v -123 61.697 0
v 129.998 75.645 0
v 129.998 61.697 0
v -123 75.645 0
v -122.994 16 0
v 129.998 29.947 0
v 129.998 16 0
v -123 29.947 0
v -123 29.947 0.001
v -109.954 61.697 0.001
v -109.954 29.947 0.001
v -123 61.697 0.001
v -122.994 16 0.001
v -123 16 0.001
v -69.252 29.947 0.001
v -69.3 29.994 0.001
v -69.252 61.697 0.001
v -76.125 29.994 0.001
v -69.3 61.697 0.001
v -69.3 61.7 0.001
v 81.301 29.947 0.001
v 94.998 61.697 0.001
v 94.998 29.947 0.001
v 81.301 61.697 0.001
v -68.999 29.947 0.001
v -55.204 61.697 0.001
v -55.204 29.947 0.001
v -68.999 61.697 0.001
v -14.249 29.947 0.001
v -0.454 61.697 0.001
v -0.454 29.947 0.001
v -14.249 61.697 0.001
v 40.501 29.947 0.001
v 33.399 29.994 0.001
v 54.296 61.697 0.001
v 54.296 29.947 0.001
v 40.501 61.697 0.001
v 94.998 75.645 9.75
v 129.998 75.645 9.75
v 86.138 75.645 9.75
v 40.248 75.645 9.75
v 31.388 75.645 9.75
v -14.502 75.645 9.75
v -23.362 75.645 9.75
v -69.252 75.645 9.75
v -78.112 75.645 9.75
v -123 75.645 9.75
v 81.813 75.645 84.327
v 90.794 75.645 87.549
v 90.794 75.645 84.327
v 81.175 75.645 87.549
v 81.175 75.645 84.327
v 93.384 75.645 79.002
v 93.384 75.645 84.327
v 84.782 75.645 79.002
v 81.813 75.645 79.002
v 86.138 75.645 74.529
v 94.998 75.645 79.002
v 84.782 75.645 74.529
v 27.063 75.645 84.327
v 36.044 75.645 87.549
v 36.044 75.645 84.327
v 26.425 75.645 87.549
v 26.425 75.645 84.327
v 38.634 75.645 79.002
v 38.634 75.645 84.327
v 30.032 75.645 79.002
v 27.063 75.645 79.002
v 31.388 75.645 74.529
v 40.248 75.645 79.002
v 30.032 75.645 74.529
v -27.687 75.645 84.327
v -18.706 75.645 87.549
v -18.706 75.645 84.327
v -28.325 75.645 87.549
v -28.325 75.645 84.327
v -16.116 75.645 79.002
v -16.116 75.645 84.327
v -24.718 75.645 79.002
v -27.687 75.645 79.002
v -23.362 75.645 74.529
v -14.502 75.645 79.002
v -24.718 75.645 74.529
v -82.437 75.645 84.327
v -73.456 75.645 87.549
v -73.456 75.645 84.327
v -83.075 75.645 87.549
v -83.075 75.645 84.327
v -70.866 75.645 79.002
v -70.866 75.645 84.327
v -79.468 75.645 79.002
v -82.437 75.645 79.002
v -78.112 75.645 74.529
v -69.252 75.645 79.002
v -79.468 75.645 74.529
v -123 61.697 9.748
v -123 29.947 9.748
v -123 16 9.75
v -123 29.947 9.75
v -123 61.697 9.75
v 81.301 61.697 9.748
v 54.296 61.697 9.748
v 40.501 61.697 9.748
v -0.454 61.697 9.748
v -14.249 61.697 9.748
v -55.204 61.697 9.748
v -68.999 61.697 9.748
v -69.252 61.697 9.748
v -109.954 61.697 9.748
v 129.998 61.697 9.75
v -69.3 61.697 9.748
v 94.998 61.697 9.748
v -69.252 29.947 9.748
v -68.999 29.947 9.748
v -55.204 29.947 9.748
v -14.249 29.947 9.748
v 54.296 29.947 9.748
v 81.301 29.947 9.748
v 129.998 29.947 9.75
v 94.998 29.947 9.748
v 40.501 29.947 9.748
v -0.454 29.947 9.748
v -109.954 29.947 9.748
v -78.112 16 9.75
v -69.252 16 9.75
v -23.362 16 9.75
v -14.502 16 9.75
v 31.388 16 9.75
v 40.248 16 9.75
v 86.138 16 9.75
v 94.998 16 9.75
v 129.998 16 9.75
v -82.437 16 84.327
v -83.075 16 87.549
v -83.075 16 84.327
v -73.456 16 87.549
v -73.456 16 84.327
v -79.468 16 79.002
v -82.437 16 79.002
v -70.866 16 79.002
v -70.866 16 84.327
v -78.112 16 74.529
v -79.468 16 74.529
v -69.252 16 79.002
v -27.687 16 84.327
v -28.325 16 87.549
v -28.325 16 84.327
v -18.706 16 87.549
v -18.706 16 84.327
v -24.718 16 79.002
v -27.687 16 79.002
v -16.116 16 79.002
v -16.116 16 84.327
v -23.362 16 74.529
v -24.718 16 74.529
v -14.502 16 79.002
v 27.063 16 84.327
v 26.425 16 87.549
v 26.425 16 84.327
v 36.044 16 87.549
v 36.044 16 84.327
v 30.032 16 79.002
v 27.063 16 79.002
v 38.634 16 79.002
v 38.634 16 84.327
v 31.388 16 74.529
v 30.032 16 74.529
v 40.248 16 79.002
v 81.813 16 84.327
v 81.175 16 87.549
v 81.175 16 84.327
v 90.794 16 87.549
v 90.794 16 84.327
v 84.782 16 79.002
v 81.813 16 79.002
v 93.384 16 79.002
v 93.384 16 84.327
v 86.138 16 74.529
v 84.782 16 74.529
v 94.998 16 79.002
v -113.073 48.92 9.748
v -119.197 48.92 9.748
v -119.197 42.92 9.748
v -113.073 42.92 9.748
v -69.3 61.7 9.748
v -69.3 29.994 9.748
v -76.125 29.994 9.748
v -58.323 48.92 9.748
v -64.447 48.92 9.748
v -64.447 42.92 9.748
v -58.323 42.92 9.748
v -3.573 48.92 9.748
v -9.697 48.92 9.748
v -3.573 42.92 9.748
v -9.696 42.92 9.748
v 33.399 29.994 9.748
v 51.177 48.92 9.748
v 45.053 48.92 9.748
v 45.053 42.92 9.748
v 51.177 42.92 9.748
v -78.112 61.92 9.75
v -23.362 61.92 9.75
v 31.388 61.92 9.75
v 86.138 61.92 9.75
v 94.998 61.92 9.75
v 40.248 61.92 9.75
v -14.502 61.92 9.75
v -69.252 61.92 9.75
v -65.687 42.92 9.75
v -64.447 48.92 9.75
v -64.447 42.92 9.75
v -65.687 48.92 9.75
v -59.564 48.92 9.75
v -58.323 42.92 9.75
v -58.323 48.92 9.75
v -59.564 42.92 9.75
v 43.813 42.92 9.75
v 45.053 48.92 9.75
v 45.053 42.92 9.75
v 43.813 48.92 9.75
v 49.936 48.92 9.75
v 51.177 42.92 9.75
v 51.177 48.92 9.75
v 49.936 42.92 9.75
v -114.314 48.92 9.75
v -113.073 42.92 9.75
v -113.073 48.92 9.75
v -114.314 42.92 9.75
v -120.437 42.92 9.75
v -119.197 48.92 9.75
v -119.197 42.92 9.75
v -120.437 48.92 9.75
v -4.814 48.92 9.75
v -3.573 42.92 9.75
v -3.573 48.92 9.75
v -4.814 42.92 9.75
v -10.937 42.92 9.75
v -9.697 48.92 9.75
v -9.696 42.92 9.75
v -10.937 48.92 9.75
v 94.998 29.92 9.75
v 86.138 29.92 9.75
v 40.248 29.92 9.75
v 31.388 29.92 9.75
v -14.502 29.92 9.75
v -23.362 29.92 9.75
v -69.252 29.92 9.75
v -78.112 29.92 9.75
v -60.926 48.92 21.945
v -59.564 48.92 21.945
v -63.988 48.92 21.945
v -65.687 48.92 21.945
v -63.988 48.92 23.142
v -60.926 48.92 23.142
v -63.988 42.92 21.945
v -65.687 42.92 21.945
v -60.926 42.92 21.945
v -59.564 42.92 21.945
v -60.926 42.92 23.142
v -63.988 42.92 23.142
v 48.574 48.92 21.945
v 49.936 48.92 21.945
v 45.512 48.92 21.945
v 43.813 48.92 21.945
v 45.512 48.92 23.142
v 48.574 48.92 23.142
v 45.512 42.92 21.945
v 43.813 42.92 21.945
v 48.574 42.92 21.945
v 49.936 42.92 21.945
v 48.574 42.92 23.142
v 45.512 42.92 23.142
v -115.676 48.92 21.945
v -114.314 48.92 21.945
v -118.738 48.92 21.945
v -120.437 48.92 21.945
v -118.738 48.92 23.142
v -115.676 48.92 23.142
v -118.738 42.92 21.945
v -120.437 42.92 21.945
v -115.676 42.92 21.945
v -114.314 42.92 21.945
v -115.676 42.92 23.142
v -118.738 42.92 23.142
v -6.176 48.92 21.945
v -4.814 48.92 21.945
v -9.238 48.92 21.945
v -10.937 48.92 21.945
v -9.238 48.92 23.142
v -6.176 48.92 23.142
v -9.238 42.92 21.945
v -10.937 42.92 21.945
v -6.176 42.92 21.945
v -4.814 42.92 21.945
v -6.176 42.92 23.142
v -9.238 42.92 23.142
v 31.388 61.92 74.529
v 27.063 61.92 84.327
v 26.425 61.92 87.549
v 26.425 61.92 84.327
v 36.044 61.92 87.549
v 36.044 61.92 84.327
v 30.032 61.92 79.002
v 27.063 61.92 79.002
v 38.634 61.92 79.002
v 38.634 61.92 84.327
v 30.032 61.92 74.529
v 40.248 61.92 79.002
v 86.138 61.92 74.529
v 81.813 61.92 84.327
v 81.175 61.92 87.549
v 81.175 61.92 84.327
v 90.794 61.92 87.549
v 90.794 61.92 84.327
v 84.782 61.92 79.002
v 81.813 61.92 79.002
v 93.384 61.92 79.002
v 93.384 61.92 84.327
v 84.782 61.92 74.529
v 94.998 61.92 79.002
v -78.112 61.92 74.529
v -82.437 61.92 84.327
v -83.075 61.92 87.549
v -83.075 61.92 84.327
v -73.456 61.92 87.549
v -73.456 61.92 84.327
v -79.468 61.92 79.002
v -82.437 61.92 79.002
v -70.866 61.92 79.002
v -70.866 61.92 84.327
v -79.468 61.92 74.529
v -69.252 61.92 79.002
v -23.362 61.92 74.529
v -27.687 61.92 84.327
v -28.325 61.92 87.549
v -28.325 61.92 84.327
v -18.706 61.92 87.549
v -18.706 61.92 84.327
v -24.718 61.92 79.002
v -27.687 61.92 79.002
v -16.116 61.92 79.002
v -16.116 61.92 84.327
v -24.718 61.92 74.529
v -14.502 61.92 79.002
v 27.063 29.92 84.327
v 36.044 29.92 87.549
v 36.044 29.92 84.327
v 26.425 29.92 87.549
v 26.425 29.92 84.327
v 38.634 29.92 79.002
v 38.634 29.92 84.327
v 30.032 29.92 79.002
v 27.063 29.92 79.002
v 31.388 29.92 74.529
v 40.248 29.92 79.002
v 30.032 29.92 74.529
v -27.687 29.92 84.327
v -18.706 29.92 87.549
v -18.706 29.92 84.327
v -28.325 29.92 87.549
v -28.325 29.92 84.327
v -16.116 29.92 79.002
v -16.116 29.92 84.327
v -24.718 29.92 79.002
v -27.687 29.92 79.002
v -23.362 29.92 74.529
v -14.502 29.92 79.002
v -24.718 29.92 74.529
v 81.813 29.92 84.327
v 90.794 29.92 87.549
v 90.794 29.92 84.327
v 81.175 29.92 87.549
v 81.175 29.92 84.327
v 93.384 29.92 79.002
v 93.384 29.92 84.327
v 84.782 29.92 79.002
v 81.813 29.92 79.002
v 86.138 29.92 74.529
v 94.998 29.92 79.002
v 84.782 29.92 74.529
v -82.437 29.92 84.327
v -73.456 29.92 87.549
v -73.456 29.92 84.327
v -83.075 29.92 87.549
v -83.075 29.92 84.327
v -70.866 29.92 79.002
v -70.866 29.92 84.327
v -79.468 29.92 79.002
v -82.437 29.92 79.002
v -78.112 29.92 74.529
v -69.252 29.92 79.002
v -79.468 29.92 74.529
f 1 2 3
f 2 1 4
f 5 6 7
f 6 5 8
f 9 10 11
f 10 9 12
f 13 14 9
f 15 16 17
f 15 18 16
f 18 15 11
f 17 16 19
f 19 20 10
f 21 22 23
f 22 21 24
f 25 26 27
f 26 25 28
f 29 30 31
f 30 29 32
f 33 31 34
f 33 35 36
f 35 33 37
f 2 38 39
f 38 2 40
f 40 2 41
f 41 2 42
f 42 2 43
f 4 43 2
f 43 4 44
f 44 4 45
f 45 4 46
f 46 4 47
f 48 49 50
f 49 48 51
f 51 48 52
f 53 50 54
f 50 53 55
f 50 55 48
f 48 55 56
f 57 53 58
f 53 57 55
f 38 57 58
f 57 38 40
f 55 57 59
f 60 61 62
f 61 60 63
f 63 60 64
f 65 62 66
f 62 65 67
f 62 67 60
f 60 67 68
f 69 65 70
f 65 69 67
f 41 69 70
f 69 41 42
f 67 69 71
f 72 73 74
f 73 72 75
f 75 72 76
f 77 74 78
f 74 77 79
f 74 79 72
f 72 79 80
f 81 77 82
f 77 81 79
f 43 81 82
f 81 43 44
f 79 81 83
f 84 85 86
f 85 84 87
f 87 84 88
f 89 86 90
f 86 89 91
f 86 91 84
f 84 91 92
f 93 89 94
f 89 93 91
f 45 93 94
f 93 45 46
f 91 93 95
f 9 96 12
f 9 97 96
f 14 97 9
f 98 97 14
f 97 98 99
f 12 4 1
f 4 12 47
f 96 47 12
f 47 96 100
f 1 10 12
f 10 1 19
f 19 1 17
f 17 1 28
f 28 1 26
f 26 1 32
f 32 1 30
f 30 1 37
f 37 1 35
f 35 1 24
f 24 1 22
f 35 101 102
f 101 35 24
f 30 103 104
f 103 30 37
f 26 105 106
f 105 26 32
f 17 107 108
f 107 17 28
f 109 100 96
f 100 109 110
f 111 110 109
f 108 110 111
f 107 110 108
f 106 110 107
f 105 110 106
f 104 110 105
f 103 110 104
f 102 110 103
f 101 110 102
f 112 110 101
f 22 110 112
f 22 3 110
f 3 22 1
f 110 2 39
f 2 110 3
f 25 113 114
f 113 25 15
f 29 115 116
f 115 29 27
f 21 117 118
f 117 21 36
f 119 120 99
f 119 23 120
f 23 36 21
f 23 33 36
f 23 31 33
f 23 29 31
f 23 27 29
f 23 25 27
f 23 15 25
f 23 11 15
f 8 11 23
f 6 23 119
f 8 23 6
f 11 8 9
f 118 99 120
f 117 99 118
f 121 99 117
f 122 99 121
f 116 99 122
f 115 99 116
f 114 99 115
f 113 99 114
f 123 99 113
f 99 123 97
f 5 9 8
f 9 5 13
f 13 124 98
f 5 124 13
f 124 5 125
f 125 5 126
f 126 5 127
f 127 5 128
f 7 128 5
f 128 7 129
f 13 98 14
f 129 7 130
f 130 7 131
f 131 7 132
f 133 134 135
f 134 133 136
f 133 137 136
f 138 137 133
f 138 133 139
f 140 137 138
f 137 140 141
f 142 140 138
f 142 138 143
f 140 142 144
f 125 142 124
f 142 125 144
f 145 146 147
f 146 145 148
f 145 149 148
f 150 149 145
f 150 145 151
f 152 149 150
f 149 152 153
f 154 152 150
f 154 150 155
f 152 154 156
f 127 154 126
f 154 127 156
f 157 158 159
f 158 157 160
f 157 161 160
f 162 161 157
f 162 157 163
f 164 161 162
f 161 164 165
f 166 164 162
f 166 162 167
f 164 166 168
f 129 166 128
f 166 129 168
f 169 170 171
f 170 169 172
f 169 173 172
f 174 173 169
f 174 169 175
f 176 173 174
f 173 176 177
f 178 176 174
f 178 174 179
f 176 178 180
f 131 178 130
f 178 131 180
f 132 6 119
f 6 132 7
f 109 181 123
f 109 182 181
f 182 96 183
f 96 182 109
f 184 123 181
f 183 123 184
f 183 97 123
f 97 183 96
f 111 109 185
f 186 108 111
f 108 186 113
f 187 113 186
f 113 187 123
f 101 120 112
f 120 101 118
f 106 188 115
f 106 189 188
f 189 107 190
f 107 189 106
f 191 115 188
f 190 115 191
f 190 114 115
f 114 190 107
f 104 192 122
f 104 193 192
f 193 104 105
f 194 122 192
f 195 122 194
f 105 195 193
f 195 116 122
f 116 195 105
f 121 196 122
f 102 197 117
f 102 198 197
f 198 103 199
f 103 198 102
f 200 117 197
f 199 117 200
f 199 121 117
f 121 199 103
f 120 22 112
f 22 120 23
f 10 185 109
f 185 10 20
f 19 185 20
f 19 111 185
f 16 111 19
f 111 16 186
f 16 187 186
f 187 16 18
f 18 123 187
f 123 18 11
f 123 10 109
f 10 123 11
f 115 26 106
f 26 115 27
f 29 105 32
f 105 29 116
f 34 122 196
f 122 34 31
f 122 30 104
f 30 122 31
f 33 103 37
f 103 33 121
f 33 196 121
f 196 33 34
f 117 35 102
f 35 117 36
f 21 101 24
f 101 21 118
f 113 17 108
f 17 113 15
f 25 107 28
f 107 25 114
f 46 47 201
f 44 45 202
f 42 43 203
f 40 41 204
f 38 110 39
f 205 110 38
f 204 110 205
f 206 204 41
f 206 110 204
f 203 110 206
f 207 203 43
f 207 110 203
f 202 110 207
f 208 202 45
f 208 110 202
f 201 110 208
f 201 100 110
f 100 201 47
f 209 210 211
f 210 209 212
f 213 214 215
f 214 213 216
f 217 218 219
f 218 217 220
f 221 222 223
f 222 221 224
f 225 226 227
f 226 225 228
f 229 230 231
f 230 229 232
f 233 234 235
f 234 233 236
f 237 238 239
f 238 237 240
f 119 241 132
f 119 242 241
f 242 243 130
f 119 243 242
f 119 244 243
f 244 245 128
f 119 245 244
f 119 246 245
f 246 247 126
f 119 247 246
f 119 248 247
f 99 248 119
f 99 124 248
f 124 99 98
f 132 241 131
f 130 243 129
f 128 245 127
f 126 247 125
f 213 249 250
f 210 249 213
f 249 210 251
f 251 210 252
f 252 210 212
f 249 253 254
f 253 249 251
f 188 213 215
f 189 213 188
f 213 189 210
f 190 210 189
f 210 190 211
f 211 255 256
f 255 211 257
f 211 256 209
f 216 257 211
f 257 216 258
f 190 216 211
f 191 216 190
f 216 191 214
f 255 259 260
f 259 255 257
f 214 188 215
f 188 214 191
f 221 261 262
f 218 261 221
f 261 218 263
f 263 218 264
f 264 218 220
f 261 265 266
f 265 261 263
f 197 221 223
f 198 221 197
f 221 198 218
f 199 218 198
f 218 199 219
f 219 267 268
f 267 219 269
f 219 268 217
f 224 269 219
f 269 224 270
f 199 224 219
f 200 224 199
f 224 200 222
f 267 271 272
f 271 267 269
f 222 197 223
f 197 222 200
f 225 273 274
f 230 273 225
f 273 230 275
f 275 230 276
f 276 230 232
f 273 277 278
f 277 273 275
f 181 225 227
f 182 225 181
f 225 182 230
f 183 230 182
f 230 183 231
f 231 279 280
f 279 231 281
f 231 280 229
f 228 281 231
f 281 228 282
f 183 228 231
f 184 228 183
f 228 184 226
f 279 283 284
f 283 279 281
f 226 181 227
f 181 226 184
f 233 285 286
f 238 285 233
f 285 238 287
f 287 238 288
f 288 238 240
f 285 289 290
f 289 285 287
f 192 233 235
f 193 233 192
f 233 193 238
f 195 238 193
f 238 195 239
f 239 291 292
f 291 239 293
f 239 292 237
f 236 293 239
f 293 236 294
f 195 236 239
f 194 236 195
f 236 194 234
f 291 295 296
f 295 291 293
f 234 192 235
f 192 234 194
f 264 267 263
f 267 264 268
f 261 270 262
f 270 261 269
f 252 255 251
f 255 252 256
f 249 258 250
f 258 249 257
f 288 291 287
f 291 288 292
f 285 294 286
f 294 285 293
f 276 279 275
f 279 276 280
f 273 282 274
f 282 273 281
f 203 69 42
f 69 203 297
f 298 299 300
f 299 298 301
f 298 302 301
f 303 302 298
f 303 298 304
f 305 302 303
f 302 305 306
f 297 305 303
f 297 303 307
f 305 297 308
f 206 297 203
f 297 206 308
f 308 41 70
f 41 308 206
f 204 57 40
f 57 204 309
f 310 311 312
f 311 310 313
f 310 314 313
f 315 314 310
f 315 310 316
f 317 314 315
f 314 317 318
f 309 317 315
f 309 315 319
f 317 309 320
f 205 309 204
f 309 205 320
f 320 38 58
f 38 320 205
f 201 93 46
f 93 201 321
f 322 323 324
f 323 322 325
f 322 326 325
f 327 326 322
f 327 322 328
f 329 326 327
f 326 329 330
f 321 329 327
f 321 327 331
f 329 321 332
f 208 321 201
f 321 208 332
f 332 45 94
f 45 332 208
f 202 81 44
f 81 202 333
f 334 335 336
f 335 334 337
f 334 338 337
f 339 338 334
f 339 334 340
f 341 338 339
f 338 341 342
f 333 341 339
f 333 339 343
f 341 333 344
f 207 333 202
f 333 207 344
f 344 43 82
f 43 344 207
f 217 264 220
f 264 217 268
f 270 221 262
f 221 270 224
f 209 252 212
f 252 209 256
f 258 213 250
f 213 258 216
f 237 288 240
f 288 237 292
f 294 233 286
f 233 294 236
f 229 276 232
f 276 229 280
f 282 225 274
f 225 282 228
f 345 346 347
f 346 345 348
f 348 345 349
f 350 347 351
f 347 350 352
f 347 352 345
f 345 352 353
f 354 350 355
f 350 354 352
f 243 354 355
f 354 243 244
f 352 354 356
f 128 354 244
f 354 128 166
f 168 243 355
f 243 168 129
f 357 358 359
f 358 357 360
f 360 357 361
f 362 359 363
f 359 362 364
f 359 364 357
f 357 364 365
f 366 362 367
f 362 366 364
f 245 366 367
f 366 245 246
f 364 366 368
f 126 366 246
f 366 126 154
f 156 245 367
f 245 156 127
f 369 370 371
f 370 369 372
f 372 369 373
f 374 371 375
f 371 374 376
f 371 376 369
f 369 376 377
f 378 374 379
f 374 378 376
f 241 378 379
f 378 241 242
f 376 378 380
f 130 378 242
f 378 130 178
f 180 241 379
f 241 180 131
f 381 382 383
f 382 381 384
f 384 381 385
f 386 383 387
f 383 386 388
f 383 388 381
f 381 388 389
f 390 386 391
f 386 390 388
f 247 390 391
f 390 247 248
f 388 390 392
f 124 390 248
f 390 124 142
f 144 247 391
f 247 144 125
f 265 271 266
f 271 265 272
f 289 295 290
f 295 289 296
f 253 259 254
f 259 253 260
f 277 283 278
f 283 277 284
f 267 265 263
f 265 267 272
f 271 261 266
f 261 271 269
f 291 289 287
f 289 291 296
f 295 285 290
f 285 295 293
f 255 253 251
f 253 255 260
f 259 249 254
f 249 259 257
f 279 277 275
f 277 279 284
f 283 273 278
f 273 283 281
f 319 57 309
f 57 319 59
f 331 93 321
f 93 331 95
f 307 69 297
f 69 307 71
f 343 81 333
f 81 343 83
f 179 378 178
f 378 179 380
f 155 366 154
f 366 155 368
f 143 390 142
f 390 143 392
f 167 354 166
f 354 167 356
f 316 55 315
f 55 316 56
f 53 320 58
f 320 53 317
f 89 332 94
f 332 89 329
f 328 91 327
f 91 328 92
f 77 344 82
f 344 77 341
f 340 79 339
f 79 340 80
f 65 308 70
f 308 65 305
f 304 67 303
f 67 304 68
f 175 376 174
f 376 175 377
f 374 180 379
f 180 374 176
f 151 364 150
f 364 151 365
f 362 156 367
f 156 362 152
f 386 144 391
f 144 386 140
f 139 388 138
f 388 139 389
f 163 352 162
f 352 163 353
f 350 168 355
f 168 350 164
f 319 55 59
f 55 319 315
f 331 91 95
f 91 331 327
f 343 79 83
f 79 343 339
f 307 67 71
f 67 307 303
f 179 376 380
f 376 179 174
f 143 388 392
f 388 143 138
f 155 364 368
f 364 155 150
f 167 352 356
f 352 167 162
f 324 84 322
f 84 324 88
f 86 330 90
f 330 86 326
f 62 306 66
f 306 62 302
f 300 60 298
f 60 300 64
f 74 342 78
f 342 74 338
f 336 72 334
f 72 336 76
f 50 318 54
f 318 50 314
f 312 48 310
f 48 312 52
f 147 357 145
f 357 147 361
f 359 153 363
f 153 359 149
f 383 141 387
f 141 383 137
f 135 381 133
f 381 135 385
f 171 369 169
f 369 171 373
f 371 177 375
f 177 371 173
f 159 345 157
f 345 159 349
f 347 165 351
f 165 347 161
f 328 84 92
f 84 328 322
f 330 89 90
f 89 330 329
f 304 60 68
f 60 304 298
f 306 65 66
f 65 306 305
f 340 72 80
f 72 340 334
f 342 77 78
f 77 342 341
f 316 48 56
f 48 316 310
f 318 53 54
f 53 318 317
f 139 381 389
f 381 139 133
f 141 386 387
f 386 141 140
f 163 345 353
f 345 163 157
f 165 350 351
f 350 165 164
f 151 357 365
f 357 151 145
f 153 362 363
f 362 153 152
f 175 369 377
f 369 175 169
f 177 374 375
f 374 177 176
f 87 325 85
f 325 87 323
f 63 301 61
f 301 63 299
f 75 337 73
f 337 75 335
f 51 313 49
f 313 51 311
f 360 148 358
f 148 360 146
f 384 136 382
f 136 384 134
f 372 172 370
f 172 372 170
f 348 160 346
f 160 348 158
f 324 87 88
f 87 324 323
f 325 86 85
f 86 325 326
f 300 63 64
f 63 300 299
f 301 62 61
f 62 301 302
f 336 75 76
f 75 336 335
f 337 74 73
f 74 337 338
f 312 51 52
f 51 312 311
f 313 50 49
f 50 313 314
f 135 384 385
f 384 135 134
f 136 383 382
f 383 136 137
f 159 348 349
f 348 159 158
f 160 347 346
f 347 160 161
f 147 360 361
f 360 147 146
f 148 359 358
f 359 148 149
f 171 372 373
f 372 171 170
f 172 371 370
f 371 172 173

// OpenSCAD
// Auto reverse-engineered from STL into layered parametric OpenSCAD
// This rebuild uses cross-section polygons between Z levels and extrudes each slab.

module slab(z, h) {
  translate([0,0,z]) linear_extrude(height=h) union() {
    children();
  }
}

module poly_shape_01() {
  polygon(points=[
    [94.997986, 29.919998],
    [86.137985, 29.919998],
    [86.137985, 15.999999],
    [94.997986, 15.999999]
  ], paths=[
    [0, 1, 2, 3]
  ]);
}

module poly_shape_02() {
  polygon(points=[
    [-78.112015, 29.919998],
    [-78.112015, 15.999999],
    [-69.252014, 15.999999],
    [-69.252014, 29.919998]
  ], paths=[
    [0, 1, 2, 3]
  ]);
}

module poly_shape_03() {
  polygon(points=[
    [-78.112015, 61.919998],
    [-69.252014, 61.919998],
    [-69.252014, 75.644997],
    [-78.112015, 75.644997]
  ], paths=[
    [0, 1, 2, 3]
  ]);
}

z_levels = [-0.000000, 0.001000, 9.748000, 9.750000, 21.945000, 23.142000, 74.529000, 79.001600, 84.327000, 87.549000];

module top_parametric(z=z_levels) {
  union() {
    // slab 0: z=-0.000000..0.001000
    slab(-0.000000, 0.001000) {
      // slab 0 poly 0
      polygon(points=[
          [20.293919, 61.696999],
          [129.997986, 61.696999],
          [129.997986, 75.644997],
          [-123.000008, 75.644997],
          [-123.000008, 61.696999]
      ], paths=[
          [0, 1, 2, 3, 4]
      ]);
      // slab 0 poly 1
      polygon(points=[
          [-122.994424, 15.999999],
          [129.997986, 15.999999],
          [129.997986, 29.946999],
          [-123.000008, 29.946999]
      ], paths=[
          [0, 1, 2, 3]
      ]);
    }
    // slab 1: z=0.001000..9.748000
    slab(0.001000, 9.747000) {
      // slab 1 poly 0
      polygon(points=[
          [-123.000008, 68.670280],
          [-123.000008, 15.999999],
          [129.997986, 15.999999],
          [129.997986, 29.946999],
          [94.997986, 29.946999],
          [94.997986, 61.696999],
          [129.997986, 61.696999],
          [129.997986, 75.644997],
          [-123.000008, 75.644997],
          [-34.505024, 61.696999],
          [-55.204014, 61.696999],
          [-55.204014, 29.946999],
          [-14.249004, 29.946999],
          [-14.249004, 61.696999],
          [33.399488, 29.993999],
          [40.500984, 29.946999],
          [40.500984, 61.696999],
          [-0.454014, 61.696999],
          [-0.454014, 29.946999],
          [-76.124513, 29.993999],
          [-69.300011, 29.993999],
          [-69.300011, 61.699997],
          [-109.954018, 61.696999],
          [-109.954018, 29.946999],
          [63.978926, 61.696999],
          [54.295986, 61.696999],
          [54.295986, 29.946999],
          [81.300987, 29.946999],
          [81.300987, 61.696999],
          [-68.999001, 61.696999],
          [-69.252014, 61.696999],
          [-69.252014, 29.946999],
          [-68.999001, 29.946999]
      ], paths=[
          [0, 1, 2, 3, 4, 5, 6, 7, 8],
          [9, 10, 11, 12, 13],
          [14, 15, 16, 17, 18],
          [19, 20, 21, 22, 23],
          [24, 25, 26, 27, 28],
          [29, 30, 31, 32]
      ]);
    }
    // slab 2: z=9.748000..9.750000
    slab(9.748000, 0.002000) {
      // slab 2 poly 0
      polygon(points=[
          [-34.505024, 61.696999],
          [129.997986, 61.696999],
          [129.997986, 75.644997],
          [-123.000008, 75.644997],
          [-123.000008, 61.696999]
      ], paths=[
          [0, 1, 2, 3, 4]
      ]);
      // slab 2 poly 1
      polygon(points=[
          [-63.651517, 29.946999],
          [-123.000008, 29.946999],
          [-123.000008, 15.999999],
          [129.997986, 15.999999],
          [129.997986, 29.946999]
      ], paths=[
          [0, 1, 2, 3, 4]
      ]);
      // slab 2 poly 2
      polygon(points=[
          [-64.446630, 42.919998],
          [-58.323427, 42.919998],
          [-58.323427, 48.919998],
          [-64.446630, 48.919998]
      ], paths=[
          [0, 1, 2, 3]
      ]);
      // slab 2 poly 3
      polygon(points=[
          [45.053381, 42.919998],
          [51.176573, 42.919998],
          [51.176573, 48.919998],
          [45.053381, 48.919998]
      ], paths=[
          [0, 1, 2, 3]
      ]);
      // slab 2 poly 4
      polygon(points=[
          [-113.073431, 42.919998],
          [-113.073431, 48.919998],
          [-119.196615, 48.919998],
          [-119.196615, 42.919998]
      ], paths=[
          [0, 1, 2, 3]
      ]);
      // slab 2 poly 5
      polygon(points=[
          [-9.696170, 42.919998],
          [-3.573428, 42.919998],
          [-3.573428, 48.919998],
          [-9.696628, 48.919998]
      ], paths=[
          [0, 1, 2, 3]
      ]);
    }
    // slab 3: z=9.750000..21.945000
    slab(9.750000, 12.195000) {
      // slab 3 poly 0
      polygon(points=[
          [39.414014, 29.919998],
          [31.387985, 29.919998],
          [31.387985, 15.999999],
          [40.247986, 15.999999],
          [40.247986, 29.919998]
      ], paths=[
          [0, 1, 2, 3, 4]
      ]);
      // slab 3 poly 1
      polygon(points=[
          [-15.335986, 29.919998],
          [-23.362015, 29.919998],
          [-23.362015, 15.999999],
          [-14.502014, 15.999999],
          [-14.502014, 29.919998]
      ], paths=[
          [0, 1, 2, 3, 4]
      ]);
      // slab 3 poly 2
            poly_shape_01();
      // slab 3 poly 3
            poly_shape_02();
      // slab 3 poly 4
      polygon(points=[
          [39.414014, 61.919998],
          [40.247986, 61.919998],
          [40.247986, 75.644997],
          [31.387985, 75.644997],
          [31.387985, 61.919998]
      ], paths=[
          [0, 1, 2, 3, 4]
      ]);
      // slab 3 poly 5
      polygon(points=[
          [94.997986, 61.919998],
          [94.997986, 75.644997],
          [86.137985, 75.644997],
          [86.137985, 61.919998]
      ], paths=[
          [0, 1, 2, 3]
      ]);
      // slab 3 poly 6
      polygon(points=[
          [-78.112015, 74.353093],
          [-78.112015, 61.919998],
          [-69.252014, 61.919998],
          [-69.252014, 75.644997],
          [-78.112015, 75.644997]
      ], paths=[
          [0, 1, 2, 3, 4]
      ]);
      // slab 3 poly 7
      polygon(points=[
          [-15.335986, 61.919998],
          [-14.502014, 61.919998],
          [-14.502014, 75.644997],
          [-23.362015, 75.644997],
          [-23.362015, 61.919998]
      ], paths=[
          [0, 1, 2, 3, 4]
      ]);
      // slab 3 poly 8
      polygon(points=[
          [49.935932, 45.652342],
          [49.935932, 48.919998],
          [43.812582, 48.919998],
          [43.812582, 42.919998],
          [49.935932, 42.919998]
      ], paths=[
          [0, 1, 2, 3, 4]
      ]);
      // slab 3 poly 9
      polygon(points=[
          [-62.898826, 42.919998],
          [-59.564071, 42.919998],
          [-59.564071, 48.919998],
          [-65.687418, 48.919998],
          [-65.687418, 42.919998]
      ], paths=[
          [0, 1, 2, 3, 4]
      ]);
      // slab 3 poly 10
      polygon(points=[
          [-10.937418, 42.919998],
          [-4.814072, 42.919998],
          [-4.814072, 48.919998],
          [-10.937418, 48.919998]
      ], paths=[
          [0, 1, 2, 3]
      ]);
      // slab 3 poly 11
      polygon(points=[
          [-117.648819, 42.919998],
          [-114.314075, 42.919998],
          [-114.314075, 48.919998],
          [-120.437410, 48.919998],
          [-120.437410, 42.919998]
      ], paths=[
          [0, 1, 2, 3, 4]
      ]);
    }
    // slab 4: z=21.945000..23.142000
    slab(21.945000, 1.197000) {
      // slab 4 poly 0
      polygon(points=[
          [-16.251816, 29.919998],
          [-23.362015, 29.919998],
          [-23.362015, 15.999999],
          [-14.502014, 15.999999],
          [-14.502014, 29.919998]
      ], paths=[
          [0, 1, 2, 3, 4]
      ]);
      // slab 4 poly 1
      polygon(points=[
          [38.498184, 29.919998],
          [31.387985, 29.919998],
          [31.387985, 15.999999],
          [40.247986, 15.999999],
          [40.247986, 29.919998]
      ], paths=[
          [0, 1, 2, 3, 4]
      ]);
      // slab 4 poly 2
            poly_shape_01();
      // slab 4 poly 3
            poly_shape_02();
      // slab 4 poly 4
      polygon(points=[
          [38.498184, 61.919998],
          [40.247986, 61.919998],
          [40.247986, 75.644997],
          [31.387985, 75.644997],
          [31.387985, 61.919998]
      ], paths=[
          [0, 1, 2, 3, 4]
      ]);
      // slab 4 poly 5
      polygon(points=[
          [94.997986, 64.455545],
          [94.997986, 75.644997],
          [86.137985, 75.644997],
          [86.137985, 61.919998],
          [94.997986, 61.919998]
      ], paths=[
          [0, 1, 2, 3, 4]
      ]);
      // slab 4 poly 6
            poly_shape_03();
      // slab 4 poly 7
      polygon(points=[
          [-16.251816, 61.919998],
          [-14.502014, 61.919998],
          [-14.502014, 75.644997],
          [-23.362015, 75.644997],
          [-23.362015, 61.919998]
      ], paths=[
          [0, 1, 2, 3, 4]
      ]);
      // slab 4 poly 8
      polygon(points=[
          [45.511995, 45.920008],
          [45.511995, 42.919998],
          [48.573739, 42.919998],
          [48.573739, 48.919998],
          [45.511995, 48.919998]
      ], paths=[
          [0, 1, 2, 3, 4]
      ]);
      // slab 4 poly 9
      polygon(points=[
          [-6.449878, 42.919998],
          [-6.176269, 42.919998],
          [-6.176269, 48.919998],
          [-9.238005, 48.919998],
          [-9.238005, 42.919998]
      ], paths=[
          [0, 1, 2, 3, 4]
      ]);
      // slab 4 poly 10
      polygon(points=[
          [-63.988003, 45.920008],
          [-63.988003, 42.919998],
          [-60.926268, 42.919998],
          [-60.926268, 48.919998],
          [-63.988003, 48.919998]
      ], paths=[
          [0, 1, 2, 3, 4]
      ]);
      // slab 4 poly 11
      polygon(points=[
          [-115.676272, 48.651894],
          [-115.676272, 48.919998],
          [-118.738005, 48.919998],
          [-118.738005, 42.919998],
          [-115.676272, 42.919998]
      ], paths=[
          [0, 1, 2, 3, 4]
      ]);
    }
    // slab 5: z=23.142000..74.529000
    slab(23.142000, 51.387000) {
      // slab 5 poly 0
      polygon(points=[
          [89.652155, 29.919998],
          [86.137985, 29.919998],
          [86.137985, 15.999999],
          [94.997986, 15.999999],
          [94.997986, 29.919998]
      ], paths=[
          [0, 1, 2, 3, 4]
      ]);
      // slab 5 poly 1
      polygon(points=[
          [-78.112015, 21.521132],
          [-78.112015, 15.999999],
          [-69.252014, 15.999999],
          [-69.252014, 29.919998],
          [-78.112015, 29.919998]
      ], paths=[
          [0, 1, 2, 3, 4]
      ]);
      // slab 5 poly 2
      polygon(points=[
          [34.902155, 29.919998],
          [31.387985, 29.919998],
          [31.387985, 15.999999],
          [40.247986, 15.999999],
          [40.247986, 29.919998]
      ], paths=[
          [0, 1, 2, 3, 4]
      ]);
      // slab 5 poly 3
      polygon(points=[
          [-19.847845, 29.919998],
          [-23.362015, 29.919998],
          [-23.362015, 15.999999],
          [-14.502014, 15.999999],
          [-14.502014, 29.919998]
      ], paths=[
          [0, 1, 2, 3, 4]
      ]);
      // slab 5 poly 4
      polygon(points=[
          [89.652155, 61.919998],
          [94.997986, 61.919998],
          [94.997986, 75.644997],
          [86.137985, 75.644997],
          [86.137985, 61.919998]
      ], paths=[
          [0, 1, 2, 3, 4]
      ]);
      // slab 5 poly 5
            poly_shape_03();
      // slab 5 poly 6
      polygon(points=[
          [34.902155, 61.919998],
          [40.247986, 61.919998],
          [40.247986, 75.644997],
          [31.387985, 75.644997],
          [31.387985, 61.919998]
      ], paths=[
          [0, 1, 2, 3, 4]
      ]);
      // slab 5 poly 7
      polygon(points=[
          [-19.847845, 61.919998],
          [-14.502014, 61.919998],
          [-14.502014, 75.644997],
          [-23.362015, 75.644997],
          [-23.362015, 61.919998]
      ], paths=[
          [0, 1, 2, 3, 4]
      ]);
    }
    // slab 6: z=74.529000..79.001600
    slab(74.529000, 4.472600) {
      // slab 6 poly 0
      polygon(points=[
          [90.567939, 29.919998],
          [84.782464, 29.919998],
          [84.782464, 15.999999],
          [94.997986, 15.999999],
          [94.997986, 29.919998]
      ], paths=[
          [0, 1, 2, 3, 4]
      ]);
      // slab 6 poly 1
      polygon(points=[
          [-79.467536, 29.919998],
          [-79.467536, 15.999999],
          [-69.252014, 15.999999],
          [-69.252014, 29.919998]
      ], paths=[
          [0, 1, 2, 3]
      ]);
      // slab 6 poly 2
      polygon(points=[
          [-18.932061, 29.919998],
          [-24.717536, 29.919998],
          [-24.717536, 15.999999],
          [-14.502014, 15.999999],
          [-14.502014, 29.919998]
      ], paths=[
          [0, 1, 2, 3, 4]
      ]);
      // slab 6 poly 3
      polygon(points=[
          [35.817939, 29.919998],
          [30.032464, 29.919998],
          [30.032464, 15.999999],
          [40.247986, 15.999999],
          [40.247986, 29.919998]
      ], paths=[
          [0, 1, 2, 3, 4]
      ]);
      // slab 6 poly 4
      polygon(points=[
          [90.567939, 61.919998],
          [94.997986, 61.919998],
          [94.997986, 75.644997],
          [84.782464, 75.644997],
          [84.782464, 61.919998]
      ], paths=[
          [0, 1, 2, 3, 4]
      ]);
      // slab 6 poly 5
      polygon(points=[
          [-79.467536, 61.919998],
          [-69.252014, 61.919998],
          [-69.252014, 75.644997],
          [-79.467536, 75.644997]
      ], paths=[
          [0, 1, 2, 3]
      ]);
      // slab 6 poly 6
      polygon(points=[
          [-18.932061, 61.919998],
          [-14.502014, 61.919998],
          [-14.502014, 75.644997],
          [-24.717536, 75.644997],
          [-24.717536, 61.919998]
      ], paths=[
          [0, 1, 2, 3, 4]
      ]);
      // slab 6 poly 7
      polygon(points=[
          [35.817939, 61.919998],
          [40.247986, 61.919998],
          [40.247986, 75.644997],
          [30.032464, 75.644997],
          [30.032464, 61.919998]
      ], paths=[
          [0, 1, 2, 3, 4]
      ]);
    }
    // slab 7: z=79.001600..84.327000
    slab(79.001600, 5.325400) {
      // slab 7 poly 0
      polygon(points=[
          [-76.095416, 15.999999],
          [-70.865755, 15.999999],
          [-70.865755, 29.919998],
          [-82.437039, 29.919998],
          [-82.437039, 15.999999]
      ], paths=[
          [0, 1, 2, 3, 4]
      ]);
      // slab 7 poly 1
      polygon(points=[
          [38.634246, 20.336328],
          [38.634246, 29.919998],
          [27.062964, 29.919998],
          [27.062964, 15.999999],
          [38.634246, 15.999999]
      ], paths=[
          [0, 1, 2, 3, 4]
      ]);
      // slab 7 poly 2
      polygon(points=[
          [-18.503779, 29.919998],
          [-27.687036, 29.919998],
          [-27.687036, 15.999999],
          [-16.115755, 15.999999],
          [-16.115755, 29.919998]
      ], paths=[
          [0, 1, 2, 3, 4]
      ]);
      // slab 7 poly 3
      polygon(points=[
          [90.996219, 29.919998],
          [81.812961, 29.919998],
          [81.812961, 15.999999],
          [93.384242, 15.999999],
          [93.384242, 29.919998]
      ], paths=[
          [0, 1, 2, 3, 4]
      ]);
      // slab 7 poly 4
      polygon(points=[
          [-76.095416, 75.644997],
          [-82.437039, 75.644997],
          [-82.437039, 61.919998],
          [-70.865755, 61.919998],
          [-70.865755, 75.644997]
      ], paths=[
          [0, 1, 2, 3, 4]
      ]);
      // slab 7 poly 5
      polygon(points=[
          [38.634246, 71.369414],
          [38.634246, 75.644997],
          [27.062964, 75.644997],
          [27.062964, 61.919998],
          [38.634246, 61.919998]
      ], paths=[
          [0, 1, 2, 3, 4]
      ]);
      // slab 7 poly 6
      polygon(points=[
          [-18.503779, 75.644997],
          [-27.687036, 75.644997],
          [-27.687036, 61.919998],
          [-16.115755, 61.919998],
          [-16.115755, 75.644997]
      ], paths=[
          [0, 1, 2, 3, 4]
      ]);
      // slab 7 poly 7
      polygon(points=[
          [83.953540, 61.919998],
          [93.384242, 61.919998],
          [93.384242, 75.644997],
          [81.812961, 75.644997],
          [81.812961, 61.919998]
      ], paths=[
          [0, 1, 2, 3, 4]
      ]);
    }
    // slab 8: z=84.327000..87.549000
    slab(84.327000, 3.222000) {
      // slab 8 poly 0
      polygon(points=[
          [-73.455897, 29.919998],
          [-83.074525, 29.919998],
          [-83.074525, 15.999999],
          [-73.455897, 15.999999]
      ], paths=[
          [0, 1, 2, 3]
      ]);
      // slab 8 poly 1
      polygon(points=[
          [27.895166, 29.919998],
          [26.425479, 29.919998],
          [26.425479, 15.999999],
          [36.044106, 15.999999],
          [36.044106, 29.919998]
      ], paths=[
          [0, 1, 2, 3, 4]
      ]);
      // slab 8 poly 2
      polygon(points=[
          [-20.137569, 15.999999],
          [-18.705896, 15.999999],
          [-18.705896, 29.919998],
          [-28.324521, 29.919998],
          [-28.324521, 15.999999]
      ], paths=[
          [0, 1, 2, 3, 4]
      ]);
      // slab 8 poly 3
      polygon(points=[
          [89.362423, 15.999999],
          [90.794097, 15.999999],
          [90.794097, 29.919998],
          [81.175475, 29.919998],
          [81.175475, 15.999999]
      ], paths=[
          [0, 1, 2, 3, 4]
      ]);
      // slab 8 poly 4
      polygon(points=[
          [-73.455897, 61.919998],
          [-73.455897, 75.644997],
          [-83.074525, 75.644997],
          [-83.074525, 61.919998]
      ], paths=[
          [0, 1, 2, 3]
      ]);
      // slab 8 poly 5
      polygon(points=[
          [27.895166, 61.919998],
          [36.044106, 61.919998],
          [36.044106, 75.644997],
          [26.425479, 75.644997],
          [26.425479, 61.919998]
      ], paths=[
          [0, 1, 2, 3, 4]
      ]);
      // slab 8 poly 6
      polygon(points=[
          [-20.137569, 61.919998],
          [-18.705896, 61.919998],
          [-18.705896, 75.644997],
          [-28.324521, 75.644997],
          [-28.324521, 61.919998]
      ], paths=[
          [0, 1, 2, 3, 4]
      ]);
      // slab 8 poly 7
      polygon(points=[
          [89.362423, 61.919998],
          [90.794097, 61.919998],
          [90.794097, 75.644997],
          [81.175475, 75.644997],
          [81.175475, 61.919998]
      ], paths=[
          [0, 1, 2, 3, 4]
      ]);
    }
  }
}

// Render
top_parametric();
